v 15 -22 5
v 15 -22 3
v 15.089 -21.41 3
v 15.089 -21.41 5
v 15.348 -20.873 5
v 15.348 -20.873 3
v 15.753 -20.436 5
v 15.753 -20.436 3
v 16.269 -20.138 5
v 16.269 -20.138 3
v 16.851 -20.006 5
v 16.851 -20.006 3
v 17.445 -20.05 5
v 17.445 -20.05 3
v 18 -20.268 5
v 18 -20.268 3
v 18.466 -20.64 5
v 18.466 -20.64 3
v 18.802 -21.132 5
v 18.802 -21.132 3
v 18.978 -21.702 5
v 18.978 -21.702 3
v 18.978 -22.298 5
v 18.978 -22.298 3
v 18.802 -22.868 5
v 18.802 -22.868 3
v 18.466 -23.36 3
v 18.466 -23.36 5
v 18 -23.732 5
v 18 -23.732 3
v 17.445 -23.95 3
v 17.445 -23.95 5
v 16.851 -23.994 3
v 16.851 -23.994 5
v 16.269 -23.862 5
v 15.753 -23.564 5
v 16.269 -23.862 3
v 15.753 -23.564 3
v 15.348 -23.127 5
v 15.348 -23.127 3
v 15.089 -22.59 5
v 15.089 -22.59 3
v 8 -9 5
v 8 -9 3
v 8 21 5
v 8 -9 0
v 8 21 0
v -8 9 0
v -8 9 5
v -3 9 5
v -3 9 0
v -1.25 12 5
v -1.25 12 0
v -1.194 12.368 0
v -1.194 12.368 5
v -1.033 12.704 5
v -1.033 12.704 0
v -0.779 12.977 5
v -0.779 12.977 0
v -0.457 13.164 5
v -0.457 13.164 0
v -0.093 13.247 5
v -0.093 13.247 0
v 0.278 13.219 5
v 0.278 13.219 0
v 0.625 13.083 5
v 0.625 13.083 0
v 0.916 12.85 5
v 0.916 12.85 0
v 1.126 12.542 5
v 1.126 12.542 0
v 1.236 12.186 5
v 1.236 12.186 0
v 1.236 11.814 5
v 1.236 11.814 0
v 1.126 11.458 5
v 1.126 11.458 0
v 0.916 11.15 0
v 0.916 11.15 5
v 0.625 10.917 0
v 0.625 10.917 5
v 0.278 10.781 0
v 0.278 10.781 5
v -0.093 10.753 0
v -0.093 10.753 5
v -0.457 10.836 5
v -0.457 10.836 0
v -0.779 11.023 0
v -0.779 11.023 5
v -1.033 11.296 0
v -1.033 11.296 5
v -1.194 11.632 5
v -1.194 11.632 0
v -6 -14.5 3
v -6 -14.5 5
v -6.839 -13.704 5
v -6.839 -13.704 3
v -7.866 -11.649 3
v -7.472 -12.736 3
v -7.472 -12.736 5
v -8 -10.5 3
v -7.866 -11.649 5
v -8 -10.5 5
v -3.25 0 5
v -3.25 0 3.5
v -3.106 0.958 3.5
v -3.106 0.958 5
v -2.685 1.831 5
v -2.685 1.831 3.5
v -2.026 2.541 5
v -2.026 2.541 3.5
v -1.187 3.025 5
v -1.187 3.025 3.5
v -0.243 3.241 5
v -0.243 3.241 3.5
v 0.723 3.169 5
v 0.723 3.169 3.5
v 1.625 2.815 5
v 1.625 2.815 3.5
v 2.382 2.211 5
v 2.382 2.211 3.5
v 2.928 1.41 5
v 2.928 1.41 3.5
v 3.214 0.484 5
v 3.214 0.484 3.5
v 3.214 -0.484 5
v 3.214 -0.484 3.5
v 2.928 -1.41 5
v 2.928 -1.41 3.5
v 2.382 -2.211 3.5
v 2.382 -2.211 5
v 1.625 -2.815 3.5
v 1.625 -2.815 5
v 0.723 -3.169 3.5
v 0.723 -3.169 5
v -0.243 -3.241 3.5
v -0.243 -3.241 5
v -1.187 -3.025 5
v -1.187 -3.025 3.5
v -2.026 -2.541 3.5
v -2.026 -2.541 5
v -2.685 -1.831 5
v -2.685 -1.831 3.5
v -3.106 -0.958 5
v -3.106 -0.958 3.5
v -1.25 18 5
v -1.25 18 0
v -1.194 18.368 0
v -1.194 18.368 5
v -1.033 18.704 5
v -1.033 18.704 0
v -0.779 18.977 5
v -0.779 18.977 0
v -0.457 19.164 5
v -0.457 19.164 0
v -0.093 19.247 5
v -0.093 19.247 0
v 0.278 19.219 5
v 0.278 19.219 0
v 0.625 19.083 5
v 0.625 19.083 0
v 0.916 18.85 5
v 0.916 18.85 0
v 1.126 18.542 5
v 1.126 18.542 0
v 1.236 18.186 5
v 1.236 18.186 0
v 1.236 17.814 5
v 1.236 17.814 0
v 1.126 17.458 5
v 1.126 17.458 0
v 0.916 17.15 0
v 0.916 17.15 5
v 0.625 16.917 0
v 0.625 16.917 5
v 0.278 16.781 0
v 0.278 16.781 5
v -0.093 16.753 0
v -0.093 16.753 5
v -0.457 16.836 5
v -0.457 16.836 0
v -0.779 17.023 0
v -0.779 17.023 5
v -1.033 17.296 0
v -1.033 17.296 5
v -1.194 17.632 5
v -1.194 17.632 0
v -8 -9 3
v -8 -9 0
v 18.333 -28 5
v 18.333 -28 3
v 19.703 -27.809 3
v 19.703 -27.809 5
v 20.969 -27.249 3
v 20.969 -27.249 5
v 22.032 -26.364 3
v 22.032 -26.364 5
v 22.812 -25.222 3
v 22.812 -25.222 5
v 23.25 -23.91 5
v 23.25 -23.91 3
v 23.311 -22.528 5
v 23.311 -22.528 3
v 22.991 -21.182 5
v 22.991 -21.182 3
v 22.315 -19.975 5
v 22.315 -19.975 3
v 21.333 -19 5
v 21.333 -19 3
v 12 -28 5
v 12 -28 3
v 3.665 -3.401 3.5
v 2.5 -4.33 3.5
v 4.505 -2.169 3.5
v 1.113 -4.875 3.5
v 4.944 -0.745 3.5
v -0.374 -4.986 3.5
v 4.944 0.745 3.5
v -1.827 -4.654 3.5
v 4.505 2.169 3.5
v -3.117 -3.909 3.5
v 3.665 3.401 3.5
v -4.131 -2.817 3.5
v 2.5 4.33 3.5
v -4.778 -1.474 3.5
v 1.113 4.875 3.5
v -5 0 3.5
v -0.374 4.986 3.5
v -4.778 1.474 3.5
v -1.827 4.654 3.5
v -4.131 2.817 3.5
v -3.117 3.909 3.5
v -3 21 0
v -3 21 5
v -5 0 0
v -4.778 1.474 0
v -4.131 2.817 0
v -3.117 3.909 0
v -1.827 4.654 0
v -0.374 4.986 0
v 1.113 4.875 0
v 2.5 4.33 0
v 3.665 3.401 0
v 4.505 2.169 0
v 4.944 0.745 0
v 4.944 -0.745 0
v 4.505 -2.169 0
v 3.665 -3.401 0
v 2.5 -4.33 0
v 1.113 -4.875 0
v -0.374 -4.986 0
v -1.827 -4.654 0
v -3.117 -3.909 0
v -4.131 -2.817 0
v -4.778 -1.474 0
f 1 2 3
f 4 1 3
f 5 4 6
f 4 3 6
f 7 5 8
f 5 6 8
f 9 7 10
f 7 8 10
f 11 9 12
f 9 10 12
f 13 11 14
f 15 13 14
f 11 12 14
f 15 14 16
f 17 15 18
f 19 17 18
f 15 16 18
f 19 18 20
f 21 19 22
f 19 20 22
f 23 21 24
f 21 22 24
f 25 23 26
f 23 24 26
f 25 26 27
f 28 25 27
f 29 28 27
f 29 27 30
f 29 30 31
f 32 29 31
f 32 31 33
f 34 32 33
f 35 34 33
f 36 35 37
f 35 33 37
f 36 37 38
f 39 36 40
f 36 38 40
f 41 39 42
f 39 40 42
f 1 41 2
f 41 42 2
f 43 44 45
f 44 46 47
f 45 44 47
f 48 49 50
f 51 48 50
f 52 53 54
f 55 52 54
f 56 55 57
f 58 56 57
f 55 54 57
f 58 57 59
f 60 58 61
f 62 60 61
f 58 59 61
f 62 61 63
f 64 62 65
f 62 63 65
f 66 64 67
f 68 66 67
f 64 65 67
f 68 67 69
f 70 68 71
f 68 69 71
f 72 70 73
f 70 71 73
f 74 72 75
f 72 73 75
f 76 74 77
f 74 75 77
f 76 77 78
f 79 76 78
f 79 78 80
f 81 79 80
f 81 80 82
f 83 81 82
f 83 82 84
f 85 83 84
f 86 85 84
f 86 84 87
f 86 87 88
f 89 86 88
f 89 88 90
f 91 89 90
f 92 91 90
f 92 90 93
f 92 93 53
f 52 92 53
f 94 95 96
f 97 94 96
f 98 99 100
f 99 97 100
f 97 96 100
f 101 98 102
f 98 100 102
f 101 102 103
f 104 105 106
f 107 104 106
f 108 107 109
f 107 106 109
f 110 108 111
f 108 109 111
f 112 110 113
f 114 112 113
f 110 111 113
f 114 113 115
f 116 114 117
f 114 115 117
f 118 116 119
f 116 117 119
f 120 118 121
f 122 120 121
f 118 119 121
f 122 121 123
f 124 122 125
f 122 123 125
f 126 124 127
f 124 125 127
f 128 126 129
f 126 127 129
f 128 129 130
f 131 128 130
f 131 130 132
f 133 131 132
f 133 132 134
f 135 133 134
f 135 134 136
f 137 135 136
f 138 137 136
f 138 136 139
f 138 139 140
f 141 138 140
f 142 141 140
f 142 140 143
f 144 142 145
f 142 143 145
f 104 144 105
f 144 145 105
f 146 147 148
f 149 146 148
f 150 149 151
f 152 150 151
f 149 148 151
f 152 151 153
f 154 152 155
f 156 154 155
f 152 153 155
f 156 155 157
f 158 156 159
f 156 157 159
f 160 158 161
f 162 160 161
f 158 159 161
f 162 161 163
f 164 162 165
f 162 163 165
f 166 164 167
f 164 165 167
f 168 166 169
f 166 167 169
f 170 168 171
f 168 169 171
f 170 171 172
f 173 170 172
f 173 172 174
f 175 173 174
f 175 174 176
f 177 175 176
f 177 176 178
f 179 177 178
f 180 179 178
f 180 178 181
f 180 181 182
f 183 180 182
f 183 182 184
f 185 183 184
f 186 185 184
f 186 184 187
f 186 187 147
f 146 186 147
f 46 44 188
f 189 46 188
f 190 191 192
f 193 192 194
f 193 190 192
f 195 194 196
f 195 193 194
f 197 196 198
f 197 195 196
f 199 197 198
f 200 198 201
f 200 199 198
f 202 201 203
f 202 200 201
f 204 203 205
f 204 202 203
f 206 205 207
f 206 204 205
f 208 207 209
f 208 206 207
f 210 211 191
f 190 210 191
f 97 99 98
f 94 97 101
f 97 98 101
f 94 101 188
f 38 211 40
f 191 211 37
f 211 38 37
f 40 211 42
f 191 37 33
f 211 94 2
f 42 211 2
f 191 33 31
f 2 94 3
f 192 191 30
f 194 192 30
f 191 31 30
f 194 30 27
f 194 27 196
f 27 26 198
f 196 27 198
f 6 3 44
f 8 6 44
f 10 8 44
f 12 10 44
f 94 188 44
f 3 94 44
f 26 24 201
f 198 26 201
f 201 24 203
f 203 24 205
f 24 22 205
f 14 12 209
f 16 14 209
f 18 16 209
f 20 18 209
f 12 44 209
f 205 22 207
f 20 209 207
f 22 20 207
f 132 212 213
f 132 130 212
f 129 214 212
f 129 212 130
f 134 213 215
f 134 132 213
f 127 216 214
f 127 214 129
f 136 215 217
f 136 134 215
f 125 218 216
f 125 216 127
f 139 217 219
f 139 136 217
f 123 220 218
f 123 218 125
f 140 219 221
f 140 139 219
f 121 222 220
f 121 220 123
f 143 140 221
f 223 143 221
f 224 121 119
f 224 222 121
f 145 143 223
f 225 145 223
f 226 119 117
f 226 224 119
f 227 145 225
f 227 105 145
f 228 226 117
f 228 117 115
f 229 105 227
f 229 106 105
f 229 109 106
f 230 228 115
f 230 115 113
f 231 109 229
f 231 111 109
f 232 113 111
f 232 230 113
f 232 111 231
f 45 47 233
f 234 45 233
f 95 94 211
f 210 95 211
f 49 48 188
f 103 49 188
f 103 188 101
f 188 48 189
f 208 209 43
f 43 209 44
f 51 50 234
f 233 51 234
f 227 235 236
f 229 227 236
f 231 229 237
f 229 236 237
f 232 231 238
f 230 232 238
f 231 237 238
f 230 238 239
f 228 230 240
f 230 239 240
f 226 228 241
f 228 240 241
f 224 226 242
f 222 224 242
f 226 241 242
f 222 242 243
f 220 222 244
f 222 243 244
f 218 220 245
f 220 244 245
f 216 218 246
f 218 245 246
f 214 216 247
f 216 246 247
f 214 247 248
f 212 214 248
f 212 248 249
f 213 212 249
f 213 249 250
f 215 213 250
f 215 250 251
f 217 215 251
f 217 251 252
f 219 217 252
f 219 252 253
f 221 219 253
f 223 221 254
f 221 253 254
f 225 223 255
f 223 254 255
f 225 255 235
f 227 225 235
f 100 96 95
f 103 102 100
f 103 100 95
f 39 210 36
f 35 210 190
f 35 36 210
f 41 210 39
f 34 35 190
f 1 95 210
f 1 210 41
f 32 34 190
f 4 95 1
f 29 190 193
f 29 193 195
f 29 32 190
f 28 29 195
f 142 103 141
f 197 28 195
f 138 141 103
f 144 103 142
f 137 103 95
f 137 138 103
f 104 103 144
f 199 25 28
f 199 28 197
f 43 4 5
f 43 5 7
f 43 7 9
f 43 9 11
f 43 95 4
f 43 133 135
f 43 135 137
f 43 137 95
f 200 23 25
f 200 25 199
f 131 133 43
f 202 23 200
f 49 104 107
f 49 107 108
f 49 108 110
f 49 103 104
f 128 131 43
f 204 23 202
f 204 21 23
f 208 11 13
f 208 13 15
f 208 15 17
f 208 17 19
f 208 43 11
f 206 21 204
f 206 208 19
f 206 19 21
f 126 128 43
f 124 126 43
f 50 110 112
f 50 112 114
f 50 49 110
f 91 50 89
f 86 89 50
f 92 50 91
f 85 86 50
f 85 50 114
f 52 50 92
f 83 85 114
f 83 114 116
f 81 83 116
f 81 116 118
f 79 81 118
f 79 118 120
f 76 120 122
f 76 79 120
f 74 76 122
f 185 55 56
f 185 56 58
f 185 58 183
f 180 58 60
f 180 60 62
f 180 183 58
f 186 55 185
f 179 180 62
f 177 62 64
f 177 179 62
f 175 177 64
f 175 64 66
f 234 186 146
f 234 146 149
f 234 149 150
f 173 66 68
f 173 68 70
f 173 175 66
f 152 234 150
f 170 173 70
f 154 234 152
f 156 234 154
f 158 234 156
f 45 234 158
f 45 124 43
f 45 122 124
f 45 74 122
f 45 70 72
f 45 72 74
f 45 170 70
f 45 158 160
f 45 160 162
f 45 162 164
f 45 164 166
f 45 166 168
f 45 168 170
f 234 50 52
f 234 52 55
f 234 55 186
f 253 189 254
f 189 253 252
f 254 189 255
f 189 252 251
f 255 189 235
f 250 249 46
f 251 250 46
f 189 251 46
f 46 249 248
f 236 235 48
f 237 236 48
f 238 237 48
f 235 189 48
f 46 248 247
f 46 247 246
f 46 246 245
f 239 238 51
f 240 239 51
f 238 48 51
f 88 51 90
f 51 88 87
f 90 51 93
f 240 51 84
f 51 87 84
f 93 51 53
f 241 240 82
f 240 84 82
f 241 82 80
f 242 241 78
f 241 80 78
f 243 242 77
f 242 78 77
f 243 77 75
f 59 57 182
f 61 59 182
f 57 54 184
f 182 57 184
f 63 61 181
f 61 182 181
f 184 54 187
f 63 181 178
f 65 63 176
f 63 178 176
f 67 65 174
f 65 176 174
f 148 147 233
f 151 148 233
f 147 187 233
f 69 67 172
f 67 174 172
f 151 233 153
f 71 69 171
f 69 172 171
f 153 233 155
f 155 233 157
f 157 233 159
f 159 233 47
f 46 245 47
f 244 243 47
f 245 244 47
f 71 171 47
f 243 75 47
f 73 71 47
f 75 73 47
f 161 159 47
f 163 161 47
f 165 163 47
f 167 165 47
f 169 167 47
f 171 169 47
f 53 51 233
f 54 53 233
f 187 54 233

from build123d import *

# Parameters (mm, degrees)
EXTRUDE1_DEPTH        = 5
SKETCH3_R             = 5
EXTRUDE3_DEPTH        = 3.5
SKETCH4_R             = 3.25
EXTRUDE4_DEPTH        = 1.5
SKETCH5_W             = 5
SKETCH5_H             = 12
EXTRUDE5_DEPTH        = 5
SKETCH6_R             = 1.25
EXTRUDE6_DEPTH        = 5
FILLET1_R             = 5
EXTRUDE7_START        = -3
EXTRUDE7_DEPTH        = 3
SKETCH8_R             = 2
EXTRUDE8_DEPTH        = 2
M3_TAPPED_HOLE1_D     = 2.5
M3_TAPPED_HOLE1_DEPTH = 8
M3_TAPPED_HOLE1_TIP   = 0.751075774


with BuildPart() as part:
    # Sketch1 → Extrude1 (new body)
    with BuildSketch(Plane.XY):
        Polygon((-8, -13), (12, -28), (33.333333333, -28), (8, -9), (8, 21), (-8, 21), align=None)
    extrude(amount=EXTRUDE1_DEPTH)

    # Sketch3 → Extrude3 (cut)
    with BuildSketch(Plane(origin=(0, 0, 0), x_dir=(-1, 0, 0), z_dir=(0, 0, -1))):
        Circle(SKETCH3_R)
    extrude(amount=-EXTRUDE3_DEPTH, mode=Mode.SUBTRACT)

    # Sketch4 → Extrude4 (cut)
    with BuildSketch(Plane(origin=(0, 0, 3.5), x_dir=(-1, 0, 0), z_dir=(0, 0, -1))):
        Circle(SKETCH4_R)
    extrude(amount=-EXTRUDE4_DEPTH, mode=Mode.SUBTRACT)

    # Sketch5 → Extrude5 (cut)
    with BuildSketch(Plane.XY.offset(5)):
        with Locations((-5.5, 15)):
            Rectangle(SKETCH5_W, SKETCH5_H)
    extrude(amount=-EXTRUDE5_DEPTH, mode=Mode.SUBTRACT)

    # Sketch6 → Extrude6 (cut)
    with BuildSketch(Plane(origin=(0, 0, 0), x_dir=(-1, 0, 0), z_dir=(0, 0, -1))):
        with Locations((0, 18)):
            Circle(SKETCH6_R)
        with Locations((0, 12)):
            Circle(SKETCH6_R)
    extrude(amount=-EXTRUDE6_DEPTH, mode=Mode.SUBTRACT)

    # Fillet1
    fillet1_edges = [part.edges().sort_by_distance(p)[0] for p in [
        (33.333333333, -28, 2.5),
        (-8, -13, 2.5),
    ]]
    fillet(fillet1_edges, radius=FILLET1_R)

    # Sketch7 → Extrude7 (cut)
    with BuildSketch(Plane(origin=(0, 0, 0), x_dir=(-1, 0, 0), z_dir=(0, 0, -1)).offset(EXTRUDE7_START)):
        with BuildLine():
            Line((-8, -9), (8, -9))
            Line((8, -9), (8, -10.5))
            ThreePointArc((8, -10.5), (7.472135955, -12.736067977), (6, -14.5))
            Line((6, -14.5), (-12, -28))
            Line((-12, -28), (-18.333333333, -28))
            ThreePointArc((-18.333333333, -28), (-23.076749824, -24.58113883), (-21.333333333, -19))
            Line((-21.333333333, -19), (-8, -9))
        make_face()
    extrude(amount=EXTRUDE7_DEPTH, mode=Mode.SUBTRACT)

    # Sketch8 → Extrude8 (cut)
    with BuildSketch(Plane(origin=(0, 0, 3), x_dir=(-1, 0, 0), z_dir=(0, 0, -1))):
        with Locations((-17, -22)):
            Circle(SKETCH8_R)
    extrude(amount=-EXTRUDE8_DEPTH, mode=Mode.SUBTRACT)

    # M3 Tapped Hole1
    with Locations(Plane(origin=(0, 18, 0), x_dir=(-1, 0, 0), z_dir=(0, 0, -1))):
        with Locations((0, 0), (0, -6)):
            Hole(M3_TAPPED_HOLE1_D / 2, depth=M3_TAPPED_HOLE1_DEPTH)
            with Locations((0, 0, -(M3_TAPPED_HOLE1_DEPTH + M3_TAPPED_HOLE1_TIP / 2))):  # 118° drill point
                Cone(0, M3_TAPPED_HOLE1_D / 2, M3_TAPPED_HOLE1_TIP, mode=Mode.SUBTRACT)


solid = part.part
